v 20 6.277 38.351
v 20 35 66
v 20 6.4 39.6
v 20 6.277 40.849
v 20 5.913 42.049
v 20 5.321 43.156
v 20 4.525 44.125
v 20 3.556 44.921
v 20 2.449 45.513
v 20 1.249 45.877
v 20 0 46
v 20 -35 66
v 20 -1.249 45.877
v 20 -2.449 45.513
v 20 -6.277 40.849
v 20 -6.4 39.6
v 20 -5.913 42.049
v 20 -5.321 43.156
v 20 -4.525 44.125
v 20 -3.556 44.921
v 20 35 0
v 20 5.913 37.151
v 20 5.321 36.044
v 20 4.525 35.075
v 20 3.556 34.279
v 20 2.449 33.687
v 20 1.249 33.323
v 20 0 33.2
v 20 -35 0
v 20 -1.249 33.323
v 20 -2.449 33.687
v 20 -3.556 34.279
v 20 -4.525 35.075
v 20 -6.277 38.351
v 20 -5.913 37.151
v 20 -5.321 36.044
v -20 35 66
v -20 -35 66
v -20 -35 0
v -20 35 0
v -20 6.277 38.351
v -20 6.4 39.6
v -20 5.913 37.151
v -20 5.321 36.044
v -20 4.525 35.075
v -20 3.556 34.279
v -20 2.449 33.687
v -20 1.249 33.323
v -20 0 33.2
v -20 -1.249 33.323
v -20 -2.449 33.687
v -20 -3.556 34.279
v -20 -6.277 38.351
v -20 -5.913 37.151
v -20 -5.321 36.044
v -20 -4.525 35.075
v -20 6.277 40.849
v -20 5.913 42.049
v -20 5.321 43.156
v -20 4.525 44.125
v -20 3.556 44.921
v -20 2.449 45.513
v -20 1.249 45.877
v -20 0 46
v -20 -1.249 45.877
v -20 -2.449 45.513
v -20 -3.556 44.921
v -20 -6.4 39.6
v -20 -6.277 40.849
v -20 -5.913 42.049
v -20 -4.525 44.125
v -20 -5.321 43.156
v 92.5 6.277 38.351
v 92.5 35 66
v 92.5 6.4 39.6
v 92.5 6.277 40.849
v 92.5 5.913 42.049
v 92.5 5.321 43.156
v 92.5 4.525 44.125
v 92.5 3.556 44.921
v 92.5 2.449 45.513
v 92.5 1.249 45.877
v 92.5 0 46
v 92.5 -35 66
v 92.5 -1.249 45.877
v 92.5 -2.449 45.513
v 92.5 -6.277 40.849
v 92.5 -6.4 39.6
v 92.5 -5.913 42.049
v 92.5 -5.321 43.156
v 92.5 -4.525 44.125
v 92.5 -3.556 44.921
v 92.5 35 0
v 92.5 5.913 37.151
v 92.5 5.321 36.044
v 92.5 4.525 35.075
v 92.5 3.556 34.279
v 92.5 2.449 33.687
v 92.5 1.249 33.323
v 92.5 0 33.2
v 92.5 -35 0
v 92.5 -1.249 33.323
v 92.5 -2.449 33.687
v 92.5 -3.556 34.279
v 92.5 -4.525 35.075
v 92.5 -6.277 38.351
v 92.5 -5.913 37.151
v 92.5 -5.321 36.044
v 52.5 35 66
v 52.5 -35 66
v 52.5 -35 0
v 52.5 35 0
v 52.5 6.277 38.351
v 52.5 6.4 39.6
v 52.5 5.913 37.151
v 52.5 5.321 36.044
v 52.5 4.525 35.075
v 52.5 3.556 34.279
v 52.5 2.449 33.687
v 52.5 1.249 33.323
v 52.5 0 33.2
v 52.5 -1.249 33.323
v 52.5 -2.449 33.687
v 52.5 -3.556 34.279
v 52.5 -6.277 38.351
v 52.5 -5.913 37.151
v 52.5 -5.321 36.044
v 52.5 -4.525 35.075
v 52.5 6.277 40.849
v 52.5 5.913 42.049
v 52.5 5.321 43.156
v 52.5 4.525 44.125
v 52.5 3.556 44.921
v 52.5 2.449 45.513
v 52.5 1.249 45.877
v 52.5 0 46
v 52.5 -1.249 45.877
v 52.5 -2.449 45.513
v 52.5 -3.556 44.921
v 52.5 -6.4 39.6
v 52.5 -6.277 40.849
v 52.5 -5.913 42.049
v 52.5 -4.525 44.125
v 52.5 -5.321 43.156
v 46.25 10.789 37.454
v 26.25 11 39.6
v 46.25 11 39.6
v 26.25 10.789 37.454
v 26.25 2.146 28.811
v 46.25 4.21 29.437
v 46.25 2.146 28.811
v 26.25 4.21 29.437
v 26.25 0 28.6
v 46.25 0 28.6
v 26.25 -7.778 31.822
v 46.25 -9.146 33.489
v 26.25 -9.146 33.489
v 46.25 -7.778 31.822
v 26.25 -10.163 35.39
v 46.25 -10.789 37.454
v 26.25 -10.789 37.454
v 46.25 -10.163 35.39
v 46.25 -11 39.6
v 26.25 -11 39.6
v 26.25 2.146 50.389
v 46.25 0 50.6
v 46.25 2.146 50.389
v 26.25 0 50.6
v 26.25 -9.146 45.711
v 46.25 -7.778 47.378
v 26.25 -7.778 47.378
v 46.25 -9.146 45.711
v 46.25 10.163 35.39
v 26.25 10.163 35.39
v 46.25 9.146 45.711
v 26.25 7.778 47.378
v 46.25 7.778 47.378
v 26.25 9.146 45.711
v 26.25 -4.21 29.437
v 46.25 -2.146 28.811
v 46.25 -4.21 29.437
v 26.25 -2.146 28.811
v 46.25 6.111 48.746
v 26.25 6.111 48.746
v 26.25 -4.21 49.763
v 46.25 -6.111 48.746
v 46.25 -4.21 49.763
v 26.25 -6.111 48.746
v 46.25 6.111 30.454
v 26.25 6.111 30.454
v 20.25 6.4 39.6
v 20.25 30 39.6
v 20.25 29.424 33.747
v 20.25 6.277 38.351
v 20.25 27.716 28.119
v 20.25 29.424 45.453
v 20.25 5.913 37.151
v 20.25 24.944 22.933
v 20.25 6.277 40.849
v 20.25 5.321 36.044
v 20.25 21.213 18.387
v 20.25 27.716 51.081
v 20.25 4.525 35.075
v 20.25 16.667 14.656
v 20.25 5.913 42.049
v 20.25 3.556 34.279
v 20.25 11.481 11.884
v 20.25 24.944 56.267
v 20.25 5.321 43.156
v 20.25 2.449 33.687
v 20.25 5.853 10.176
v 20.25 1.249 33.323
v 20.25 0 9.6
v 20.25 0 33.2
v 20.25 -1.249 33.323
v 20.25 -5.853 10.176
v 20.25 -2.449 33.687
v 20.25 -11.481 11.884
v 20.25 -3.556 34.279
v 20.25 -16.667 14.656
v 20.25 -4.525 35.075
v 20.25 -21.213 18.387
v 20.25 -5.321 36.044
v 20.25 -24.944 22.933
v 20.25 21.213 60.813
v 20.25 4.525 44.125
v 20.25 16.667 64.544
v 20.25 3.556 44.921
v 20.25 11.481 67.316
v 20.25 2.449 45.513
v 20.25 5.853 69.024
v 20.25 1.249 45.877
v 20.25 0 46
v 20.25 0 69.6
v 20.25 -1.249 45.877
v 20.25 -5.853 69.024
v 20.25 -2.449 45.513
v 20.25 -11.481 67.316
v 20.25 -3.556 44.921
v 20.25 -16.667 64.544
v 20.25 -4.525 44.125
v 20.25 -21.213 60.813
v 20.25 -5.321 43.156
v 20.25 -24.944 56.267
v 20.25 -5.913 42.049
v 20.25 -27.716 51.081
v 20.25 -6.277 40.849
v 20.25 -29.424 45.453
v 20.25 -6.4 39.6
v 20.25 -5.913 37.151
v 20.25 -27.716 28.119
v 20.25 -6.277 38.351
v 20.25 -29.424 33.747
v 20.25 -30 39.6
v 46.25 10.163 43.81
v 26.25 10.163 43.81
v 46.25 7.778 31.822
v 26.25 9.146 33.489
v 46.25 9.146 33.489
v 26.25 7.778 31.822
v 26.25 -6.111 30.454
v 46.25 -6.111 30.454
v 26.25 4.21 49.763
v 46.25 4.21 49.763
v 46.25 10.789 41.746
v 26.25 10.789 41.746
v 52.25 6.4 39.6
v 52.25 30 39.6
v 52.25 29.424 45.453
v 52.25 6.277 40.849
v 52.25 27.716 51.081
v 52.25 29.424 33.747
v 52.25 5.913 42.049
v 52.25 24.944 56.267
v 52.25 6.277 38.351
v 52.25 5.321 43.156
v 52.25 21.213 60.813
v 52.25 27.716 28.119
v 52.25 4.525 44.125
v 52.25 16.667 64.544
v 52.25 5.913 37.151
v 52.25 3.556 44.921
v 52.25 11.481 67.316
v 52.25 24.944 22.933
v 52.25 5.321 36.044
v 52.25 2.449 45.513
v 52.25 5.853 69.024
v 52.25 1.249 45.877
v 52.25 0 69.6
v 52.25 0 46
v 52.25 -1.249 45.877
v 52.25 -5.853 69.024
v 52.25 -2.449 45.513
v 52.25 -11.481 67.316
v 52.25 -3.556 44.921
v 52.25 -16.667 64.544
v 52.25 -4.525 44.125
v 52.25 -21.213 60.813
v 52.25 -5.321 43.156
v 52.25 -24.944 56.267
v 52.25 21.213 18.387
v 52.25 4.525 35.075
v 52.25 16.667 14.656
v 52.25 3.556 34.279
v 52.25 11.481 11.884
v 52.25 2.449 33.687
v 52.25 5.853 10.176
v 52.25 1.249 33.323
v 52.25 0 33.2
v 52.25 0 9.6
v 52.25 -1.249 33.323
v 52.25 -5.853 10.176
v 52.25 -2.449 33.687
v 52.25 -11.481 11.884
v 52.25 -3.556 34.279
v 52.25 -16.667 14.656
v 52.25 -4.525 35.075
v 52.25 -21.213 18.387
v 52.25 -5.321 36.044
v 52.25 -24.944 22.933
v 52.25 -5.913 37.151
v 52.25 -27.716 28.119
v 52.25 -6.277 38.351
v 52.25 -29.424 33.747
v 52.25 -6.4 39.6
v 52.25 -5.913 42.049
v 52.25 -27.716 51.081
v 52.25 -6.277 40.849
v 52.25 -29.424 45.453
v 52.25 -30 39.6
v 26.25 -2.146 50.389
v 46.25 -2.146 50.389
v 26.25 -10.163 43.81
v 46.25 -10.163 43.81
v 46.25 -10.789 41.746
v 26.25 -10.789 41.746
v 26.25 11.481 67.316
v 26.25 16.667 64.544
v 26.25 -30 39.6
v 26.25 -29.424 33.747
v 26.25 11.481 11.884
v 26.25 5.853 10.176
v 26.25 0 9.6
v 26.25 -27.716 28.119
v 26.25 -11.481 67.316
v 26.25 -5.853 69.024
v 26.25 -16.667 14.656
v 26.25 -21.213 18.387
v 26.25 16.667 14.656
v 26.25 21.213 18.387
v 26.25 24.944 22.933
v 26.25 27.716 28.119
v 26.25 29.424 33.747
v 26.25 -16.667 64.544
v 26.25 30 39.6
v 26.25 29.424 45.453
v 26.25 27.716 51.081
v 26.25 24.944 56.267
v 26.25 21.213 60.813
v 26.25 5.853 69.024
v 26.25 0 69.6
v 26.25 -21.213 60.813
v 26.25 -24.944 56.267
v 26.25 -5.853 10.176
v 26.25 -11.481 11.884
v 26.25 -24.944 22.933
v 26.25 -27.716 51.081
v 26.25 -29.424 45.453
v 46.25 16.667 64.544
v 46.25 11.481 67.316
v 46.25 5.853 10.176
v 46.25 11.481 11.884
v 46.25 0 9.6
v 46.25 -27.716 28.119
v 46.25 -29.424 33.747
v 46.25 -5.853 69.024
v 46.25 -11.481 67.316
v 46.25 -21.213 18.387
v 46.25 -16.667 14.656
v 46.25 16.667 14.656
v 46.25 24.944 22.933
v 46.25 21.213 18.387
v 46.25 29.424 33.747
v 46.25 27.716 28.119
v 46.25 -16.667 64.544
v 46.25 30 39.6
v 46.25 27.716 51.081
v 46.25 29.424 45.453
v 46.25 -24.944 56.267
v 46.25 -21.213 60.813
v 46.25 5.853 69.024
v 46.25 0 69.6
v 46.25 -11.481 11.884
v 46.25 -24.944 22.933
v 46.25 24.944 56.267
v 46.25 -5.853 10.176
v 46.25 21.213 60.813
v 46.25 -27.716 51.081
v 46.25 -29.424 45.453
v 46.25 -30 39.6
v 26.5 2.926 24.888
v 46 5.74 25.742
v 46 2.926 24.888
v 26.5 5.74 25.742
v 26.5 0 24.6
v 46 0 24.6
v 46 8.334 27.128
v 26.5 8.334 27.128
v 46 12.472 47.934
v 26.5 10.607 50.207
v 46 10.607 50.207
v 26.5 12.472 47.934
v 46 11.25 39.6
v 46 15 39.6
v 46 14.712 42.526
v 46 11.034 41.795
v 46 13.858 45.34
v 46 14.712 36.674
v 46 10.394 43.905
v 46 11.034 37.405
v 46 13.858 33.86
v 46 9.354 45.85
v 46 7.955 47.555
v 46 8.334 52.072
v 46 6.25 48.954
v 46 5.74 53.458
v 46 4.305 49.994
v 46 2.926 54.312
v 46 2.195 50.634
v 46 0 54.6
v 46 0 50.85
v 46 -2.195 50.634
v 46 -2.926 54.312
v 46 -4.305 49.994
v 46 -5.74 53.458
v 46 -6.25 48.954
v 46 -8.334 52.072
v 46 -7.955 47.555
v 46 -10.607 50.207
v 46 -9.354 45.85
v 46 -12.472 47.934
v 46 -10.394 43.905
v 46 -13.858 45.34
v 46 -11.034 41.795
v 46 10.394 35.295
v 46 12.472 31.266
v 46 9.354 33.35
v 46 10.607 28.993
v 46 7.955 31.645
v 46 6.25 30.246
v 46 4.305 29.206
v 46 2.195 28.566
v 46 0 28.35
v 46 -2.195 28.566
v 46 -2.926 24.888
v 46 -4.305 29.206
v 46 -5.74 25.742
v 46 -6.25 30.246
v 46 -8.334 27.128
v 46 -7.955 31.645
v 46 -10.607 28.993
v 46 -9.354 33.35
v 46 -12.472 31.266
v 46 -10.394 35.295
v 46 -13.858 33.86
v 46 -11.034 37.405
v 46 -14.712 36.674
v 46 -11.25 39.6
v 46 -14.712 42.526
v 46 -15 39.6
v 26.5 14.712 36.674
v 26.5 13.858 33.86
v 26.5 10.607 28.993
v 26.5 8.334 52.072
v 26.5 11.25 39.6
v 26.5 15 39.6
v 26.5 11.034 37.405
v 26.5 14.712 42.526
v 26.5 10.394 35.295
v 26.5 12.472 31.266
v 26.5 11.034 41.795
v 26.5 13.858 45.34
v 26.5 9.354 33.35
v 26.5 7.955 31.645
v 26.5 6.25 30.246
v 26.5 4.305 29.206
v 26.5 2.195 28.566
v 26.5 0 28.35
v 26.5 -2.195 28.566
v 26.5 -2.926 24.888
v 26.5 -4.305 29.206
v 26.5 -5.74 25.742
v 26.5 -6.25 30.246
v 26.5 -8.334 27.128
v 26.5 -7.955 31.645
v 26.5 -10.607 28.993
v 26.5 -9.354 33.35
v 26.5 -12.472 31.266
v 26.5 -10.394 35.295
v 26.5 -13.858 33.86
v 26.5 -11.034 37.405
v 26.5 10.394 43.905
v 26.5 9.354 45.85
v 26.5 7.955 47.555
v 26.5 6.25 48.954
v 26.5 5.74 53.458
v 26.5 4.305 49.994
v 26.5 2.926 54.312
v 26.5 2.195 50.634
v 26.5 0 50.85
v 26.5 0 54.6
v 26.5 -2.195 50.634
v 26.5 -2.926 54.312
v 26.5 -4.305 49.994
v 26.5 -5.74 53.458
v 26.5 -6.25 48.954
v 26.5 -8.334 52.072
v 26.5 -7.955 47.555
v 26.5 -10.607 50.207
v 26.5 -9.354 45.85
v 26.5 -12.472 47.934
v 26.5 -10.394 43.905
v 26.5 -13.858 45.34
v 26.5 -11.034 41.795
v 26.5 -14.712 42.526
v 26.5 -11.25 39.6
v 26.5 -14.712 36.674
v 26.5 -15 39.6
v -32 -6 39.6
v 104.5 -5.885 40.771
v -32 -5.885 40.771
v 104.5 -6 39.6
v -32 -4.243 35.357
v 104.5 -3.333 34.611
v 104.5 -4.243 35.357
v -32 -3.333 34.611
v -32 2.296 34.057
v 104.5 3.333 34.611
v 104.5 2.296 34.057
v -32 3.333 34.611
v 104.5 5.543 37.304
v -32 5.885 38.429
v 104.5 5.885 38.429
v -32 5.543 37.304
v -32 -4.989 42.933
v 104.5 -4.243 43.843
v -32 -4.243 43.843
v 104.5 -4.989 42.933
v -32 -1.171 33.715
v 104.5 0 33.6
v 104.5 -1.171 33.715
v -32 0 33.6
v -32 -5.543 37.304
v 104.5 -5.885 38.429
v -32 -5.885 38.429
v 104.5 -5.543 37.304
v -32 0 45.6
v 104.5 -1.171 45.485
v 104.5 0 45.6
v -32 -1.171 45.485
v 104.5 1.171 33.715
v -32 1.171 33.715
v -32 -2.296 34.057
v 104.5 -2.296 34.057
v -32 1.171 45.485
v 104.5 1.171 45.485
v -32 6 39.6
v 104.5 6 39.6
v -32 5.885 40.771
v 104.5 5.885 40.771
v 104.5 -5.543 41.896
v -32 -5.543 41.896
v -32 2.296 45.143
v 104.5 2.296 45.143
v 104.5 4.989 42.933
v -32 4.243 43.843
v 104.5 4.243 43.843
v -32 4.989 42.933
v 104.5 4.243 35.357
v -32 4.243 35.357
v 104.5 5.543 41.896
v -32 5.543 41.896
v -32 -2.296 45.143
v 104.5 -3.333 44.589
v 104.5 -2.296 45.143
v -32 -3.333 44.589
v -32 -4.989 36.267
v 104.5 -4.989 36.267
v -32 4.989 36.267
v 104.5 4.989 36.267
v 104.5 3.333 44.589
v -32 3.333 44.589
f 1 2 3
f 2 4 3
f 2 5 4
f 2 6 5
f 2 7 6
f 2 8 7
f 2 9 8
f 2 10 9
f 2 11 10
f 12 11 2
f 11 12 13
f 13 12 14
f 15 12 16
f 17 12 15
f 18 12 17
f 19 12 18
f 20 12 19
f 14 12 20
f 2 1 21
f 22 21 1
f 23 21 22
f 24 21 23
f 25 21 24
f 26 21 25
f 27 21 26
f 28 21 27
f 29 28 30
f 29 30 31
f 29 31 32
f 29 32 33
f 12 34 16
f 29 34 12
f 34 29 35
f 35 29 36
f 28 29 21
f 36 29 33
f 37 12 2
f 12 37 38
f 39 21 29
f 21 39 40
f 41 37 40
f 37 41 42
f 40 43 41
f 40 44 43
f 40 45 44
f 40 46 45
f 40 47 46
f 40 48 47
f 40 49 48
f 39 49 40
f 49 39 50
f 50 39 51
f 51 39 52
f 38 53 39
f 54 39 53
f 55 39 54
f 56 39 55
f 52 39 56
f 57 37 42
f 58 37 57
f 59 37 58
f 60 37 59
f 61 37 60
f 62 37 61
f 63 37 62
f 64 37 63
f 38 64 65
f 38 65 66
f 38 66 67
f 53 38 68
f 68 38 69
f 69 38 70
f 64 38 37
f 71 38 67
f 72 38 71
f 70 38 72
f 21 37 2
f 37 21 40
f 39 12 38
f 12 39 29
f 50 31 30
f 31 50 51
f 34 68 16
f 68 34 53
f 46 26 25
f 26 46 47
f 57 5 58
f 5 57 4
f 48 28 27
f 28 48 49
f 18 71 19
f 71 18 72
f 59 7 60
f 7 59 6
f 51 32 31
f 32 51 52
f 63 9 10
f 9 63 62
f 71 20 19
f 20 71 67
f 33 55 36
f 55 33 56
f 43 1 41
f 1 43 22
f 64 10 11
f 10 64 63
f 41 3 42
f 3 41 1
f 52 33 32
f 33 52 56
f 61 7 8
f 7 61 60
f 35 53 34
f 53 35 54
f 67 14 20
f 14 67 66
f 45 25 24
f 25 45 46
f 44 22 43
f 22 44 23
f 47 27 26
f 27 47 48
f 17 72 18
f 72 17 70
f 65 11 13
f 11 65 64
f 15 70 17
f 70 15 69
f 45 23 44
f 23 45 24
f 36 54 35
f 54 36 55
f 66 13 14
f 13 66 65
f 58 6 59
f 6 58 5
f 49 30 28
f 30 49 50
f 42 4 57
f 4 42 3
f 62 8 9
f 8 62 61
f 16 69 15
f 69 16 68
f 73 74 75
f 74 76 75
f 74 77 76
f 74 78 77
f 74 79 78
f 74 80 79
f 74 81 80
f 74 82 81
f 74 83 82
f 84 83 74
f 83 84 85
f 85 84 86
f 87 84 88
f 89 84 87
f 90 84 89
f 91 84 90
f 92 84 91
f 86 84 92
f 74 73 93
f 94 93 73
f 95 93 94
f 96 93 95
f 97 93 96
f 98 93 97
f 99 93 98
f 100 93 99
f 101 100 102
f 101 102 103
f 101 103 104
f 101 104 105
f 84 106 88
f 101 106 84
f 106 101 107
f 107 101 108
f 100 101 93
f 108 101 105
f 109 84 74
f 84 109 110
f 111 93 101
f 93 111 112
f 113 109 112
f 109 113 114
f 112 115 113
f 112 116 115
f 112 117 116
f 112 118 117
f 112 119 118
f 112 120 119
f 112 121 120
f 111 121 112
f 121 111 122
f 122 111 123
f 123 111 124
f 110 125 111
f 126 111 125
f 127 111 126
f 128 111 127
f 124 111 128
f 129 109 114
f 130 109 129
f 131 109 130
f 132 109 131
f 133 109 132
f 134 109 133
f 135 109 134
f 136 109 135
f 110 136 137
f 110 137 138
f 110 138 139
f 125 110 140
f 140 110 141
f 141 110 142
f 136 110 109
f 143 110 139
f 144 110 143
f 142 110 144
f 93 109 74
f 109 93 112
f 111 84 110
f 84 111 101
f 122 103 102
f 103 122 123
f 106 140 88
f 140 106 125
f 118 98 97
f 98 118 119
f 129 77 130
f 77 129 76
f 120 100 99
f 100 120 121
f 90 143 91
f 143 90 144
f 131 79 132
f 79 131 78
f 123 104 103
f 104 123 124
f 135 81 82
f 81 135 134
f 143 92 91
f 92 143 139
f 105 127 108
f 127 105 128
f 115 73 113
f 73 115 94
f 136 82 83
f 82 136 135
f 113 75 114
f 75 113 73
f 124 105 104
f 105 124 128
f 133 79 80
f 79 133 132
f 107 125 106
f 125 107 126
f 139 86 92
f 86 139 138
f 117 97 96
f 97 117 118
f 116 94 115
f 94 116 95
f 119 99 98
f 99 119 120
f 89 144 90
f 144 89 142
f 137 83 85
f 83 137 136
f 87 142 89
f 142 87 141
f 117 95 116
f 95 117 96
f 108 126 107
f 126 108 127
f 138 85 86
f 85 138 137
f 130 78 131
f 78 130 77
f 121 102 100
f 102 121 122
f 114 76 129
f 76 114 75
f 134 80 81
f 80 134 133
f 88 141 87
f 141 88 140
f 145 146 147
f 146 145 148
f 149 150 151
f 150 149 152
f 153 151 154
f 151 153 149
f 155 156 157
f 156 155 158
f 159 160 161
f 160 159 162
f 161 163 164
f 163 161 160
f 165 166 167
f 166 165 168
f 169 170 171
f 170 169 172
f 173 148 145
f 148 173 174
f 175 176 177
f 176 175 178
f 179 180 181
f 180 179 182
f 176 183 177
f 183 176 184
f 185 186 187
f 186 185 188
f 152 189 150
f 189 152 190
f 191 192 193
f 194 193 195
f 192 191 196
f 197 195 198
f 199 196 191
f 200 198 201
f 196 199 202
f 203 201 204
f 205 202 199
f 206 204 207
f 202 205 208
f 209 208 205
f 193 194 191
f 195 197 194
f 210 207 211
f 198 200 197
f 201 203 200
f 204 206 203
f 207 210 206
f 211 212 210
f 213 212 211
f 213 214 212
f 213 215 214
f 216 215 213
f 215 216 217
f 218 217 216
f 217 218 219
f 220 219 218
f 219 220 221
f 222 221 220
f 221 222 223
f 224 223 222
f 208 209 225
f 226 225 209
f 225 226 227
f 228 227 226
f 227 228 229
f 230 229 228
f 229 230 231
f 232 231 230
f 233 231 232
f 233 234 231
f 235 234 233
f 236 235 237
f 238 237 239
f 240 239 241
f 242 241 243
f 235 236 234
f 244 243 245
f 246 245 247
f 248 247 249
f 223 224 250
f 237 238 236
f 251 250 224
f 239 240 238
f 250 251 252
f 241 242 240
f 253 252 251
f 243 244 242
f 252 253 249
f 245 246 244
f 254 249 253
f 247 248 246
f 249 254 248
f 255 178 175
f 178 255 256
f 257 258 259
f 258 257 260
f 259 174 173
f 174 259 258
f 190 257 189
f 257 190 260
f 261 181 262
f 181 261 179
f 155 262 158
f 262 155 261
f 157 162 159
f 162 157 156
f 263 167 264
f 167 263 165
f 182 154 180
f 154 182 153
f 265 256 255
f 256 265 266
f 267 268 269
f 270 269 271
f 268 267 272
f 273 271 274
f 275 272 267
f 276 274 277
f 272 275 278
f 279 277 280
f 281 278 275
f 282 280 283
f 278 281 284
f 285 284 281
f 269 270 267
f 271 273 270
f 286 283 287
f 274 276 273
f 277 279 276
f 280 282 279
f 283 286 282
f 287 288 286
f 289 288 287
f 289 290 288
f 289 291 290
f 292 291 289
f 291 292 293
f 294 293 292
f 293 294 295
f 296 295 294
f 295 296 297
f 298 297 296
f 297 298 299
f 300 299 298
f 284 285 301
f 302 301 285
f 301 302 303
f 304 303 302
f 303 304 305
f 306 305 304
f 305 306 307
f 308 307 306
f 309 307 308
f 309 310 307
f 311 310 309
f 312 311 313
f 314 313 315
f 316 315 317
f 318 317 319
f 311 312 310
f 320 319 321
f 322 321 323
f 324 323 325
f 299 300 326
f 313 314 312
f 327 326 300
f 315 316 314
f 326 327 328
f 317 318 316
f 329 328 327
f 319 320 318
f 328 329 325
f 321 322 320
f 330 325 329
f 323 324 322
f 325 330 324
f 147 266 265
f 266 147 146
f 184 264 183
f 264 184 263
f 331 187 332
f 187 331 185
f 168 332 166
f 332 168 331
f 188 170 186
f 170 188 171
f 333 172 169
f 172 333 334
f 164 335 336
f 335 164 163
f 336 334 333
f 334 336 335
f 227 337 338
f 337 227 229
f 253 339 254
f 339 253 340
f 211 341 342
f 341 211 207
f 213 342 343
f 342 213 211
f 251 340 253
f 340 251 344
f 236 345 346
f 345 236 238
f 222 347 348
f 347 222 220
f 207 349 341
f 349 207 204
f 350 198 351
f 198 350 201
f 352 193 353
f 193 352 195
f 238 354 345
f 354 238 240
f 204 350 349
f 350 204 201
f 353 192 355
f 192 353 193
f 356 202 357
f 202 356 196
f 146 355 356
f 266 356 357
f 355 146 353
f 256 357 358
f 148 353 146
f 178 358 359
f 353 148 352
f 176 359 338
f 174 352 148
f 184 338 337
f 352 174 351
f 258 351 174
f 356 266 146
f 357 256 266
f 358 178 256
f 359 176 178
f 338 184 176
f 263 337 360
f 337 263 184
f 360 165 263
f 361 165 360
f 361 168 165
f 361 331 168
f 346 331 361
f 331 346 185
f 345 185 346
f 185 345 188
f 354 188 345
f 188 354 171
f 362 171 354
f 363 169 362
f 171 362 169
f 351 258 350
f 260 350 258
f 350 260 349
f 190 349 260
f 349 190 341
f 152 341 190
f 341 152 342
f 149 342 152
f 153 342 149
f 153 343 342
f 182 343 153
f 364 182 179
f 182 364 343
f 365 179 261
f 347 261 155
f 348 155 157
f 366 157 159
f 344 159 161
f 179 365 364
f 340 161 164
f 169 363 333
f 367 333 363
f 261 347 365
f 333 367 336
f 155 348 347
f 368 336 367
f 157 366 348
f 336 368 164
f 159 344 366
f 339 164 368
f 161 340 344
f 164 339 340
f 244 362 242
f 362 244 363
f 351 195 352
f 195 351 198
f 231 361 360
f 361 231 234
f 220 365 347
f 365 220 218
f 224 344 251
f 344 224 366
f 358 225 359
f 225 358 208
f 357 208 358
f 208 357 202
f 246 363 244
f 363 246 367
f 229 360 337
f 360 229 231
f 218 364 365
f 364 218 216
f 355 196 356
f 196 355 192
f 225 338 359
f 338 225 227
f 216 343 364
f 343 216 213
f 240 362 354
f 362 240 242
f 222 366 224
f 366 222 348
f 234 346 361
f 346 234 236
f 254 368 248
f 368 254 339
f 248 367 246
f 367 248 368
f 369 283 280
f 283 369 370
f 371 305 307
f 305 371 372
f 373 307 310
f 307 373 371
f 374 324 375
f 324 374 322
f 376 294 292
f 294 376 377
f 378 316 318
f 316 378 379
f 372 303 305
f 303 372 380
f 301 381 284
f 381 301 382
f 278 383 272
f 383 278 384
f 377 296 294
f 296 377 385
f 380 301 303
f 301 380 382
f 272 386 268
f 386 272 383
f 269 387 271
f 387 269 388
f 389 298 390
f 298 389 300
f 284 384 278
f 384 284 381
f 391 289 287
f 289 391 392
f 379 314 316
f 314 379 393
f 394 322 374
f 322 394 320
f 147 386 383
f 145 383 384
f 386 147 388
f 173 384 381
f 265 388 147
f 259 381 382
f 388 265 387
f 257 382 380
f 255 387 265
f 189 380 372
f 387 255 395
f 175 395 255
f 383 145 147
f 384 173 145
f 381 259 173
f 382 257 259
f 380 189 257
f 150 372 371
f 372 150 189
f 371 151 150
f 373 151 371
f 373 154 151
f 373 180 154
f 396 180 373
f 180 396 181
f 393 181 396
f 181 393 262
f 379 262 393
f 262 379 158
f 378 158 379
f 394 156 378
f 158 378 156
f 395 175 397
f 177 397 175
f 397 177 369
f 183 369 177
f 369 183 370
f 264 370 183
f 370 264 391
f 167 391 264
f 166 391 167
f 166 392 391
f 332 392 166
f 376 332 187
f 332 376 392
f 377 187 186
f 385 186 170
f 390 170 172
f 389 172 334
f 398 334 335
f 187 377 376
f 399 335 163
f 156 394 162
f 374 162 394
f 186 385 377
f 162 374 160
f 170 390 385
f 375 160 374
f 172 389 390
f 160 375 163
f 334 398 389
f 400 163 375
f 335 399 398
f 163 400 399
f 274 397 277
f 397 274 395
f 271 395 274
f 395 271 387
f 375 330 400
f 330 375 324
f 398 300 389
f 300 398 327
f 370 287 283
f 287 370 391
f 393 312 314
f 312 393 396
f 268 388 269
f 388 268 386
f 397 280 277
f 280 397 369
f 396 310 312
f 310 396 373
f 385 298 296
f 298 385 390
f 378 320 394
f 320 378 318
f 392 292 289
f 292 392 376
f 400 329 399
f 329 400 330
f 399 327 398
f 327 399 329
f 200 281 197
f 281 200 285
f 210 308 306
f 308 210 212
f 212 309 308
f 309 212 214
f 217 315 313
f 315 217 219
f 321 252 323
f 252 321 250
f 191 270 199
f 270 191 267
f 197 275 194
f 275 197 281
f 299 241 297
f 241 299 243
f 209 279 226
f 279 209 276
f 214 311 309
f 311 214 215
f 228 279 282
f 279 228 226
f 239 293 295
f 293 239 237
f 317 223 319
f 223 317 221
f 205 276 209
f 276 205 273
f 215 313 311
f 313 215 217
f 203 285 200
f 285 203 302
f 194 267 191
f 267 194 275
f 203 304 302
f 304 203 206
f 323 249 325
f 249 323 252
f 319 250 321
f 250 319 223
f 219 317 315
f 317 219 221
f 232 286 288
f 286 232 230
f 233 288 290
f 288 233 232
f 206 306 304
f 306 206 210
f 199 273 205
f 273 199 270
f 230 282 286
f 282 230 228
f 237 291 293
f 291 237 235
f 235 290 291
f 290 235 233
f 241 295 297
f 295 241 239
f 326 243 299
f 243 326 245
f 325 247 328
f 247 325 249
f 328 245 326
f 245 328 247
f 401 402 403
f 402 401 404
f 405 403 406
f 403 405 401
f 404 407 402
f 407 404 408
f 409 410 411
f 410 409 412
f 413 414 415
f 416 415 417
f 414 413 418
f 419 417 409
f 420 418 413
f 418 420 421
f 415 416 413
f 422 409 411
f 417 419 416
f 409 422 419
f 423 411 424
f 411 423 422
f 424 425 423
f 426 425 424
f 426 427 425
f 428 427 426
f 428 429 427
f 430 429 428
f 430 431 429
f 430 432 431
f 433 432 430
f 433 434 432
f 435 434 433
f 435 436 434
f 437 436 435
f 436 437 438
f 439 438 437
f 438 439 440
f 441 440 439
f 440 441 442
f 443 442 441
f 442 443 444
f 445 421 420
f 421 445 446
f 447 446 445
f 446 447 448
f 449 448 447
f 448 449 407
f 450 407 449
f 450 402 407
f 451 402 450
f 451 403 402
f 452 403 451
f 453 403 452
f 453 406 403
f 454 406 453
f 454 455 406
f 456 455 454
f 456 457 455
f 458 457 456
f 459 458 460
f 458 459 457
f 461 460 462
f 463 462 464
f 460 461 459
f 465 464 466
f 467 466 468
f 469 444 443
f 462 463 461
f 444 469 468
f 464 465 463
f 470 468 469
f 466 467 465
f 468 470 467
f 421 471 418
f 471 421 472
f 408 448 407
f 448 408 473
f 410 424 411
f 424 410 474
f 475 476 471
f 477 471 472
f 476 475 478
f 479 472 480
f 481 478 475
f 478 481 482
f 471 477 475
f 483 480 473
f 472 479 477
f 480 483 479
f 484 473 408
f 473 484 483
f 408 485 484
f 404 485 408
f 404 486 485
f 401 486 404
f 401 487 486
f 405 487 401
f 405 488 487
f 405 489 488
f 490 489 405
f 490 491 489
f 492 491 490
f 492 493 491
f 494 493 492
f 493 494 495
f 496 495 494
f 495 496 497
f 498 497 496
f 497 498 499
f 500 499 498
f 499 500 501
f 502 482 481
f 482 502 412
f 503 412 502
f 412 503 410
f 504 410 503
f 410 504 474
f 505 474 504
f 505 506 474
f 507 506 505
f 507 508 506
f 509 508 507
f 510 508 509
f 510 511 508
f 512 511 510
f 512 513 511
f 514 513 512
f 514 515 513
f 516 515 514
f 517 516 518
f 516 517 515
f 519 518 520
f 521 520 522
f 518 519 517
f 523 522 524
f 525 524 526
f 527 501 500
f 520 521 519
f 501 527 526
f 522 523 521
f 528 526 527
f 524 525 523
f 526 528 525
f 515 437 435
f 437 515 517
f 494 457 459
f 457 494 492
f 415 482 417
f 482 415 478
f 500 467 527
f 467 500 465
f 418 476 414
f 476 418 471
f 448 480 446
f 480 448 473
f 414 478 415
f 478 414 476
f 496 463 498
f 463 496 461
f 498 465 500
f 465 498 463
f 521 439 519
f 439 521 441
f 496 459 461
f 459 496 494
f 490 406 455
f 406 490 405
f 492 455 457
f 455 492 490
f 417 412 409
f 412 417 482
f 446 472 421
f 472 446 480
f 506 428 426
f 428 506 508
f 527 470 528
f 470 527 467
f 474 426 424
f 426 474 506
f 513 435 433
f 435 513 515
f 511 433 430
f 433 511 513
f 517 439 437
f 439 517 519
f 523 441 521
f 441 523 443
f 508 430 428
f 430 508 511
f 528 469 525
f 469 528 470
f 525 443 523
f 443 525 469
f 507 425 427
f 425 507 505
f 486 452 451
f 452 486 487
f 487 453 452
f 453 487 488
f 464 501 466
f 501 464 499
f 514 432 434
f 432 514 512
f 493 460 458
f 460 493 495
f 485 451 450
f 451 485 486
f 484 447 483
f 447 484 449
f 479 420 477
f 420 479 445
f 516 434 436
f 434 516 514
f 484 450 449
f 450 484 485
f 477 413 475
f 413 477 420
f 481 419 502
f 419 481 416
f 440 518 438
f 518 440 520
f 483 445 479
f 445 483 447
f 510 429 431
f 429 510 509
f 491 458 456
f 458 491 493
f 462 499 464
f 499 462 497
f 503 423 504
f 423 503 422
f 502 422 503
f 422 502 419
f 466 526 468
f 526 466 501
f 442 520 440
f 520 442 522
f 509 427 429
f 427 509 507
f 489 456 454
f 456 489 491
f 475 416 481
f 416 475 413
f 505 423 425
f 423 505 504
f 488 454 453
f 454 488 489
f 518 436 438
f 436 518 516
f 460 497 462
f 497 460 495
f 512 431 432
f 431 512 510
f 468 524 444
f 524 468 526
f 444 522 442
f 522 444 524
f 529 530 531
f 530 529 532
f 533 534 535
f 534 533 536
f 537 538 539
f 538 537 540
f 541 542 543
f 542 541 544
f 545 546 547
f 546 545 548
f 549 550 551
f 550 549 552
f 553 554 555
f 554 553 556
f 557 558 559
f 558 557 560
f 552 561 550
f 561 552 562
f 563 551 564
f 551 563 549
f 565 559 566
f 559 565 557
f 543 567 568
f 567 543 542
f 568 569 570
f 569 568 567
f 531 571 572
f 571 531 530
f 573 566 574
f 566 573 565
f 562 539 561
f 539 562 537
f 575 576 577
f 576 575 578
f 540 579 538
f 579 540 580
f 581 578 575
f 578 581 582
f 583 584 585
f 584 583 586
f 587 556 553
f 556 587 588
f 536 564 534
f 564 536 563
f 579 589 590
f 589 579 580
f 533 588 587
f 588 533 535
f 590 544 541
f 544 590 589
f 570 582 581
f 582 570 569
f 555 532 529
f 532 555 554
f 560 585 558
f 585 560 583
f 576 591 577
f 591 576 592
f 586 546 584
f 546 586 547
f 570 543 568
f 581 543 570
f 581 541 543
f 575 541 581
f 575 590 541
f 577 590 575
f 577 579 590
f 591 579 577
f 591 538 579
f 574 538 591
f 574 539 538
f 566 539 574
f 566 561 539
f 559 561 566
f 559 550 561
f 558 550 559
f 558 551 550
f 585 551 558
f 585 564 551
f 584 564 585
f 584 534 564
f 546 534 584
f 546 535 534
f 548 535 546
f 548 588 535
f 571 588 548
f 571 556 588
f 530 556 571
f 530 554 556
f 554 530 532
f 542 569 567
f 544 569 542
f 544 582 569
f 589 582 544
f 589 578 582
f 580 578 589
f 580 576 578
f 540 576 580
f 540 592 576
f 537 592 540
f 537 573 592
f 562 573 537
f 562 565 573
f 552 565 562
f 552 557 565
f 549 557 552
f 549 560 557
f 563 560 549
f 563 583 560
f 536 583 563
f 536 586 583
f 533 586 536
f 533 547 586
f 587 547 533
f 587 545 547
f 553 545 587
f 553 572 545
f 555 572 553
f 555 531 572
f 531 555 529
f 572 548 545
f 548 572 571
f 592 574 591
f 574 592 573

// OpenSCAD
$fn = 32;

// ------------------------------------------------------------------------
// Pulley assembly: d60 pulley with a belt, shaft d12
// Every part is its own module, assembly() places them once.
// ------------------------------------------------------------------------

// --- part 1 ---
module support1() {
  difference() {
    translate([-20, -35, 0]) cube([40, 70, 66]);
    translate([0, 0, 39.6]) rotate([0, 90, 0]) cylinder(h = 42, d = 12.8, center = true);
  }
}

// --- part 2 ---
module support2() {
  difference() {
    translate([-20, -35, 0]) cube([40, 70, 66]);
    translate([0, 0, 39.6]) rotate([0, 90, 0]) cylinder(h = 42, d = 12.8, center = true);
  }
}

// --- part 3 ---
module shaft() {
  translate([0, 0, -68.25]) cylinder(h = 136.5, d = 12);
}

// --- part 4 ---
module pulley() {
  difference() {
    union() {
      cylinder(h = 32, d = 22);
      cylinder(h = 6, d = 60);
      translate([0, 0, 26]) cylinder(h = 6, d = 60);
    }
    translate([0, 0, -1]) cylinder(h = 34, d = 12.8);
  }
}

// --- part 5 ---
module belt() {
  difference() {
      translate([0, 0, 0]) cylinder(h = 19.5, d = 30);
      translate([0, 0, -1]) cylinder(h = 21.5, d = 22.5);
    }
}

// --- assembly ---
module assembly() {
  translate([0, 0, 0]) rotate([0, 0, 0]) support1();
  translate([72.5, 0, 0]) rotate([0, 0, 0]) support2();
  translate([36.25, 0, 39.6]) rotate([0, 90, 0]) shaft();
  translate([20.25, 0, 39.6]) rotate([0, 90, 0]) pulley();
  translate([26.5, 0, 39.6]) rotate([0, 90, 0]) belt();
}

assembly();
